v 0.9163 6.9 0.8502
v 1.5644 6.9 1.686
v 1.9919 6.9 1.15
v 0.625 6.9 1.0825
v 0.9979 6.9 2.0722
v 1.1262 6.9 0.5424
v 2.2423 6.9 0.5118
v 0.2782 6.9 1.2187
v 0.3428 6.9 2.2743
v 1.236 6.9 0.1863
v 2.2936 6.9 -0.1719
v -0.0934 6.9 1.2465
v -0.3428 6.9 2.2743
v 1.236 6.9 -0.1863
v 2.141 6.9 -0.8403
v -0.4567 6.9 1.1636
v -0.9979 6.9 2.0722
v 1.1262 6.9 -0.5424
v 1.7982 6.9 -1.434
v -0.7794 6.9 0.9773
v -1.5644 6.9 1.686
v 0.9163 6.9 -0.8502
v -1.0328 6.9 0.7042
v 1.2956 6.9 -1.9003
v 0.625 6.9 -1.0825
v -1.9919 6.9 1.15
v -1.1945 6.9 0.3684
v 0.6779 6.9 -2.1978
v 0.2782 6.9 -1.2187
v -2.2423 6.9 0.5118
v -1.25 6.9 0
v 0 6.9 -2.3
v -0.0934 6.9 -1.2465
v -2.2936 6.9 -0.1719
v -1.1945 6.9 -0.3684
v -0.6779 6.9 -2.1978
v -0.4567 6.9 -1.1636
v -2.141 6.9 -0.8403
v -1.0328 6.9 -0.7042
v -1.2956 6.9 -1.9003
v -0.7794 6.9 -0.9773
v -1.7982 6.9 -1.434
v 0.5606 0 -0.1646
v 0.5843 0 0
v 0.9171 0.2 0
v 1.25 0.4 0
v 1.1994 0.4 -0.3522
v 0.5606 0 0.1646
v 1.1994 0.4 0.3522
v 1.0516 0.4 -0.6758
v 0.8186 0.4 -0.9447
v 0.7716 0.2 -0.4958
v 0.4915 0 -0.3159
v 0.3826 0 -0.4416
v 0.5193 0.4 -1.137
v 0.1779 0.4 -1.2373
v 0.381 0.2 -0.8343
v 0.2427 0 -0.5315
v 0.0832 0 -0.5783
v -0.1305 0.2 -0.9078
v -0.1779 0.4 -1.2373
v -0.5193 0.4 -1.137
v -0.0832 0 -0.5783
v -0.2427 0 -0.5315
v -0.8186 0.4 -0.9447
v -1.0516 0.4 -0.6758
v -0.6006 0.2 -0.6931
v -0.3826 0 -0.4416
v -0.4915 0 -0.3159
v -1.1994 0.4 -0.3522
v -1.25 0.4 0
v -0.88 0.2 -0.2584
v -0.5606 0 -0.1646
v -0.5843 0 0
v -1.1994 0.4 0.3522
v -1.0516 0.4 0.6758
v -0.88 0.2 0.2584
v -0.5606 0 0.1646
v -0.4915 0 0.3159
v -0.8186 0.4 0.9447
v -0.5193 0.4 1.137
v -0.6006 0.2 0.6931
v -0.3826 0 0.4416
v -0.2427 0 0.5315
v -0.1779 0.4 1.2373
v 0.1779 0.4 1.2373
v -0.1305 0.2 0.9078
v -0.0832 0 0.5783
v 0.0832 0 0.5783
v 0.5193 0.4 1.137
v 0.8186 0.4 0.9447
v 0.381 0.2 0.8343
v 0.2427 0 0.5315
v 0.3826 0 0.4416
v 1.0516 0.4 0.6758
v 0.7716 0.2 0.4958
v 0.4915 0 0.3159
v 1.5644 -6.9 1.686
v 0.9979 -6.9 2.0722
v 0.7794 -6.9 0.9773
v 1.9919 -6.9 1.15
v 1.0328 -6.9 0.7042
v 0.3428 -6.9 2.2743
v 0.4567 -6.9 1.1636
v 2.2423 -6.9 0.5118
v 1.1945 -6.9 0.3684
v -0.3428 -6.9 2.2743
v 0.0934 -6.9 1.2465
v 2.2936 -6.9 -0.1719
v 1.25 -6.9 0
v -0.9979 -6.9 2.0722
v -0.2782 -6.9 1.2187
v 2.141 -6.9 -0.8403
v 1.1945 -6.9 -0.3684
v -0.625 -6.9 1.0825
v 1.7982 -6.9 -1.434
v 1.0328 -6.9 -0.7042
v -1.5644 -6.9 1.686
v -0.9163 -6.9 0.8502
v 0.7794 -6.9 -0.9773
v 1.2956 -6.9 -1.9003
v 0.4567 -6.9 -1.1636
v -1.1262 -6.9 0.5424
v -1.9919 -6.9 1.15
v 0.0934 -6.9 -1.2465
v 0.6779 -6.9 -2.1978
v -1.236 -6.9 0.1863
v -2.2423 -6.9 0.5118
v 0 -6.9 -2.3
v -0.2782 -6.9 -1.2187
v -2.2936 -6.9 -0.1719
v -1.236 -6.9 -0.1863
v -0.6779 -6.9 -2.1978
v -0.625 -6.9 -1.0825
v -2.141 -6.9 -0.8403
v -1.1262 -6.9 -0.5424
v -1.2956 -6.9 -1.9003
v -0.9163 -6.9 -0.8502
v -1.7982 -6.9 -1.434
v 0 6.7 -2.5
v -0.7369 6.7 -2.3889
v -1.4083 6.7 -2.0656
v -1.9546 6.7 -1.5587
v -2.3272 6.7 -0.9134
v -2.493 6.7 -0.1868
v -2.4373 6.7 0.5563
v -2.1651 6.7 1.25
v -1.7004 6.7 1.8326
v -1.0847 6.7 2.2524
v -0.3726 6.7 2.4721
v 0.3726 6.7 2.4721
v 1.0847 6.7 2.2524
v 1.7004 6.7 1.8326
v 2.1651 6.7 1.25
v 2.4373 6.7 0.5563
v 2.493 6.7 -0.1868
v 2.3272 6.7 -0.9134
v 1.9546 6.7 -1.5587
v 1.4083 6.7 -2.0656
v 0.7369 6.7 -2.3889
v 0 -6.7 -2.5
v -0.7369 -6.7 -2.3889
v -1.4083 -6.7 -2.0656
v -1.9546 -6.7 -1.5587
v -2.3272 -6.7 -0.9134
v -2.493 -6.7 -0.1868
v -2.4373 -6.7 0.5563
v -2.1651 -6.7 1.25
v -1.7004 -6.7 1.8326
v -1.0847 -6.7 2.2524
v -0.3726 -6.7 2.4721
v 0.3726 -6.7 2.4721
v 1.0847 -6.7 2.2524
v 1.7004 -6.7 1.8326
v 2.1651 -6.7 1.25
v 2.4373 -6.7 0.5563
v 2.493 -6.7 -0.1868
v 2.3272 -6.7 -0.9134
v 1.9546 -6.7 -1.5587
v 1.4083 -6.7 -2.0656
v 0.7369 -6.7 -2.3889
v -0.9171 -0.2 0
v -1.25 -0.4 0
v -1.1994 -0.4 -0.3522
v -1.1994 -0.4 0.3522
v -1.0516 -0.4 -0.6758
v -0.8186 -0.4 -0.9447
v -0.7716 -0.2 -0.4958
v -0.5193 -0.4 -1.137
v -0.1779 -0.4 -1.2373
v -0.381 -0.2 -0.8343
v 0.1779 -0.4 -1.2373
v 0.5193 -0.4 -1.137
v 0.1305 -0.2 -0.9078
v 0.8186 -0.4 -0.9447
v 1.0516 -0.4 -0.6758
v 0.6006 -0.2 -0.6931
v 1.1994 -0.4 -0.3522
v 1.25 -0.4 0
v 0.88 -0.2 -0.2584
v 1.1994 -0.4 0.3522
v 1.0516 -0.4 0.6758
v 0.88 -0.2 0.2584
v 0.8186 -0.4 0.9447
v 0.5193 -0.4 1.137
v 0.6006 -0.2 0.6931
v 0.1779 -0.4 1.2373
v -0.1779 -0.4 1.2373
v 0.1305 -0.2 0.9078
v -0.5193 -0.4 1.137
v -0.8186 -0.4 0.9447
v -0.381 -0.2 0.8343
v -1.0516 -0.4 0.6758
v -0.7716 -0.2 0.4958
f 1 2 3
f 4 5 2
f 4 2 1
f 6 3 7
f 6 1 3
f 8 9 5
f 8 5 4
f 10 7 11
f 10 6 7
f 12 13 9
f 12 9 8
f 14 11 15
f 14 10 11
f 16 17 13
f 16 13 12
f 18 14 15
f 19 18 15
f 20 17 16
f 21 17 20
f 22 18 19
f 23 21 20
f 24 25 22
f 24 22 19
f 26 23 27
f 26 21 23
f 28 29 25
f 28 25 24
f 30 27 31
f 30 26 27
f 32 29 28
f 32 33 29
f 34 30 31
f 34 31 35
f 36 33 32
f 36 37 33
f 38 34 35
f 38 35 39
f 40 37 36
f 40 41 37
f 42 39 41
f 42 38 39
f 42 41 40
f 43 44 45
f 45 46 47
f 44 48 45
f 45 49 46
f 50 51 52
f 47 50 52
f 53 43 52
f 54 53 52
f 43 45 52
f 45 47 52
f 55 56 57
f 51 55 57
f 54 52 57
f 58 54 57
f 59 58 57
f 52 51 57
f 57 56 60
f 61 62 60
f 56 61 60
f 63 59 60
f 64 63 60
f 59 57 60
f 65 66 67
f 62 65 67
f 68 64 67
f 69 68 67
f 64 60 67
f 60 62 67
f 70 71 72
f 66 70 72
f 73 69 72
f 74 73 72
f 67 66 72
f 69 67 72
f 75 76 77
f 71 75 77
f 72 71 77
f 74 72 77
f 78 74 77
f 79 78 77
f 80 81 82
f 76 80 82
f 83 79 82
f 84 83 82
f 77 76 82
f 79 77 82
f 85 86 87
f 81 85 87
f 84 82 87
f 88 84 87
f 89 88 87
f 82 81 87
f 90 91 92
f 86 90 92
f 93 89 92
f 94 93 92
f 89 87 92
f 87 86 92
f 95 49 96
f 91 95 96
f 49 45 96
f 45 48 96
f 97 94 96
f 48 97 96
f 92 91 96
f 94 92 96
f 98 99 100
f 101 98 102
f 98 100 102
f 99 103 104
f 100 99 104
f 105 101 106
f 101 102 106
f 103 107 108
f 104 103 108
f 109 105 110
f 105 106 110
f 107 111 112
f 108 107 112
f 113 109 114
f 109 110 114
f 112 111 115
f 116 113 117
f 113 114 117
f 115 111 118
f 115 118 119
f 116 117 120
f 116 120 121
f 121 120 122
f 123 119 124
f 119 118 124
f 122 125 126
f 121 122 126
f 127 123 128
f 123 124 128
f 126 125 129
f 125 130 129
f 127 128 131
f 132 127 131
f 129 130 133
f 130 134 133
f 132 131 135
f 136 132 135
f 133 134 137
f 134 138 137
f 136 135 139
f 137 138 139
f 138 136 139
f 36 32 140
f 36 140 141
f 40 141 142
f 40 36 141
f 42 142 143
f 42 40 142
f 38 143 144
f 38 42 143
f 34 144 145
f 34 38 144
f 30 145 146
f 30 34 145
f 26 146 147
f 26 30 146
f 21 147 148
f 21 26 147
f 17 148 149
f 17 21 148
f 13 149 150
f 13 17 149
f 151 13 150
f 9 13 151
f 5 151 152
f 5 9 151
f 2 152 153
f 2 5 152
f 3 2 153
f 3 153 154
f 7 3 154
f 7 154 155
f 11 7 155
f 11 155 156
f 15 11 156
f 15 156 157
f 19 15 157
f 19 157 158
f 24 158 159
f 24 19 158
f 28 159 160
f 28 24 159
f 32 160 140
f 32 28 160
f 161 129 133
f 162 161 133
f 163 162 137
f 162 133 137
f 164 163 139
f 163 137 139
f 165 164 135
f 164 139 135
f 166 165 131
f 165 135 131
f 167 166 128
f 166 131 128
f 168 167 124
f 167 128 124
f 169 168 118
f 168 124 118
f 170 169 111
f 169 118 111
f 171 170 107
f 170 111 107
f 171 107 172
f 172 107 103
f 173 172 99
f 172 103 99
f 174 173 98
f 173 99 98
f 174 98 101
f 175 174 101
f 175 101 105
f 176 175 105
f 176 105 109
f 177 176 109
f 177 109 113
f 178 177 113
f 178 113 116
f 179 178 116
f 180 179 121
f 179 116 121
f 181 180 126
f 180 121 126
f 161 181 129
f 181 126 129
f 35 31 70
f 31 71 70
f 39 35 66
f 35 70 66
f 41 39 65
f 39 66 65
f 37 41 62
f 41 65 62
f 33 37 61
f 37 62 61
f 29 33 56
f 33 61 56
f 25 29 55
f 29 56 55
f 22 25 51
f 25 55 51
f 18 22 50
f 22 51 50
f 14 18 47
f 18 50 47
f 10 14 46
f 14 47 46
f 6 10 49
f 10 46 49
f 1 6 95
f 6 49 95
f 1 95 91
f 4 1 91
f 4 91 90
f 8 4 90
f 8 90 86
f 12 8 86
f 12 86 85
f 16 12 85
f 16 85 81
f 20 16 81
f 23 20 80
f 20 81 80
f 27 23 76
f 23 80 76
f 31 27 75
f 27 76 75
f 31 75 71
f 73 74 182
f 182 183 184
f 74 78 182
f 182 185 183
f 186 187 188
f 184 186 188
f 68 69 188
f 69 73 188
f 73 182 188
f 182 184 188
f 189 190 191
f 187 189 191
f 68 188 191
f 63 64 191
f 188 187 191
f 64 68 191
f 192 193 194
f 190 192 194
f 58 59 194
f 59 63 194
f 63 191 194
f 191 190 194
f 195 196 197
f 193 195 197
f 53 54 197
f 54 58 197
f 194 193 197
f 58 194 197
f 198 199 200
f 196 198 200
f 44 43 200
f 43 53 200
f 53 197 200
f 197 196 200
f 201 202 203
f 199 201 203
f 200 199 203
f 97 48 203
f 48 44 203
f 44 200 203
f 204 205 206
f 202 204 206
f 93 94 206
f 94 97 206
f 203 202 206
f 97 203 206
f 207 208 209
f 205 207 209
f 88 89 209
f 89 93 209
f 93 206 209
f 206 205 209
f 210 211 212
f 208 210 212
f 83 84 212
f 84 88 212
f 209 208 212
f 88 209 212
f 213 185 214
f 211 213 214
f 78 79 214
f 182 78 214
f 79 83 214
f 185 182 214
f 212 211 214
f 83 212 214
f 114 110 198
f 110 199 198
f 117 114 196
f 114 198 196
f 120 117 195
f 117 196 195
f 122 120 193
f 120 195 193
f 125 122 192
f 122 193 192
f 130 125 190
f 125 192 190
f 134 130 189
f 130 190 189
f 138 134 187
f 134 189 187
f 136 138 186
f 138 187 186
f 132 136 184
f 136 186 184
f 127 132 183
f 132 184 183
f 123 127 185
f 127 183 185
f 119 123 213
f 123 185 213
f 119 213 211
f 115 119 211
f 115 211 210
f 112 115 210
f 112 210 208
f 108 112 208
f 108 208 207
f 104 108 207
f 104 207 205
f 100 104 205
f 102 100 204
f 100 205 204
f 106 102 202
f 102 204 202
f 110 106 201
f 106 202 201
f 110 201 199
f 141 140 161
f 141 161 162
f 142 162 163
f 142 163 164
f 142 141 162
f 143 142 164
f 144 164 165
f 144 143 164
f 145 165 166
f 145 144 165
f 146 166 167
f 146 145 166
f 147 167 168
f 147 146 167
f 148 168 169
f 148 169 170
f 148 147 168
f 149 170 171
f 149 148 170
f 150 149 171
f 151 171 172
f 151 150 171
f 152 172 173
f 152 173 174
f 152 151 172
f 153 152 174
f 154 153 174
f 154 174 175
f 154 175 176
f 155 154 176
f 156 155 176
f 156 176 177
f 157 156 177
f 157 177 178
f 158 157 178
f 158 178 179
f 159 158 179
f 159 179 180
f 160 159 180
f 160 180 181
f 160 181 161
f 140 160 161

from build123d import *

# Parameters (mm, degrees)
SKETCH_1_R             = 2.5
EXTRUDE_1_DEPTH        = 6.9
HOLE_WIZARD_M3_1_D     = 2.5
HOLE_WIZARD_M3_1_DEPTH = 6.5
HOLE_WIZARD_M3_1_TIP   = 0.751075774
HOLE_WIZARD_M3_2_D     = 2.5
HOLE_WIZARD_M3_2_DEPTH = 6.5
HOLE_WIZARD_M3_2_TIP   = 0.751075774
CHAMFER_1_SIZE         = 0.2


with BuildPart() as part:
    # 草图1 → 凸台-拉伸1 (new, symmetric)
    with BuildSketch(Plane(origin=(0, 0, 0), x_dir=(1, 0, 0), z_dir=(0, 1, 0))):
        with Locations(Location((0, 0, 0), (0, 0, 90))):
            Circle(SKETCH_1_R)
    extrude(amount=EXTRUDE_1_DEPTH, both=True)

    # M3 螺纹孔1
    with Locations(Plane(origin=(0, 6.9, 0), x_dir=(1, 0, 0), z_dir=(0, 1, 0))):
        with Locations((0, 0)):
            Hole(HOLE_WIZARD_M3_1_D / 2, depth=HOLE_WIZARD_M3_1_DEPTH)
            with Locations((0, 0, -(HOLE_WIZARD_M3_1_DEPTH + HOLE_WIZARD_M3_1_TIP / 2))):  # 118° drill point
                Cone(0, HOLE_WIZARD_M3_1_D / 2, HOLE_WIZARD_M3_1_TIP, mode=Mode.SUBTRACT)

    # M3 螺纹孔2
    with Locations(Plane(origin=(0, -6.9, 0), x_dir=(-1, 0, 0), z_dir=(0, -1, 0))):
        with Locations((0, 0)):
            Hole(HOLE_WIZARD_M3_2_D / 2, depth=HOLE_WIZARD_M3_2_DEPTH)
            with Locations((0, 0, -(HOLE_WIZARD_M3_2_DEPTH + HOLE_WIZARD_M3_2_TIP / 2))):  # 118° drill point
                Cone(0, HOLE_WIZARD_M3_2_D / 2, HOLE_WIZARD_M3_2_TIP, mode=Mode.SUBTRACT)

    # 倒角1
    chamfer_1_edges = [part.edges().sort_by_distance(p)[0] for p in [
        (0, -6.9, 2.5),
        (0, 6.9, 2.5),
    ]]
    chamfer(chamfer_1_edges, length=CHAMFER_1_SIZE)


solid = part.part
